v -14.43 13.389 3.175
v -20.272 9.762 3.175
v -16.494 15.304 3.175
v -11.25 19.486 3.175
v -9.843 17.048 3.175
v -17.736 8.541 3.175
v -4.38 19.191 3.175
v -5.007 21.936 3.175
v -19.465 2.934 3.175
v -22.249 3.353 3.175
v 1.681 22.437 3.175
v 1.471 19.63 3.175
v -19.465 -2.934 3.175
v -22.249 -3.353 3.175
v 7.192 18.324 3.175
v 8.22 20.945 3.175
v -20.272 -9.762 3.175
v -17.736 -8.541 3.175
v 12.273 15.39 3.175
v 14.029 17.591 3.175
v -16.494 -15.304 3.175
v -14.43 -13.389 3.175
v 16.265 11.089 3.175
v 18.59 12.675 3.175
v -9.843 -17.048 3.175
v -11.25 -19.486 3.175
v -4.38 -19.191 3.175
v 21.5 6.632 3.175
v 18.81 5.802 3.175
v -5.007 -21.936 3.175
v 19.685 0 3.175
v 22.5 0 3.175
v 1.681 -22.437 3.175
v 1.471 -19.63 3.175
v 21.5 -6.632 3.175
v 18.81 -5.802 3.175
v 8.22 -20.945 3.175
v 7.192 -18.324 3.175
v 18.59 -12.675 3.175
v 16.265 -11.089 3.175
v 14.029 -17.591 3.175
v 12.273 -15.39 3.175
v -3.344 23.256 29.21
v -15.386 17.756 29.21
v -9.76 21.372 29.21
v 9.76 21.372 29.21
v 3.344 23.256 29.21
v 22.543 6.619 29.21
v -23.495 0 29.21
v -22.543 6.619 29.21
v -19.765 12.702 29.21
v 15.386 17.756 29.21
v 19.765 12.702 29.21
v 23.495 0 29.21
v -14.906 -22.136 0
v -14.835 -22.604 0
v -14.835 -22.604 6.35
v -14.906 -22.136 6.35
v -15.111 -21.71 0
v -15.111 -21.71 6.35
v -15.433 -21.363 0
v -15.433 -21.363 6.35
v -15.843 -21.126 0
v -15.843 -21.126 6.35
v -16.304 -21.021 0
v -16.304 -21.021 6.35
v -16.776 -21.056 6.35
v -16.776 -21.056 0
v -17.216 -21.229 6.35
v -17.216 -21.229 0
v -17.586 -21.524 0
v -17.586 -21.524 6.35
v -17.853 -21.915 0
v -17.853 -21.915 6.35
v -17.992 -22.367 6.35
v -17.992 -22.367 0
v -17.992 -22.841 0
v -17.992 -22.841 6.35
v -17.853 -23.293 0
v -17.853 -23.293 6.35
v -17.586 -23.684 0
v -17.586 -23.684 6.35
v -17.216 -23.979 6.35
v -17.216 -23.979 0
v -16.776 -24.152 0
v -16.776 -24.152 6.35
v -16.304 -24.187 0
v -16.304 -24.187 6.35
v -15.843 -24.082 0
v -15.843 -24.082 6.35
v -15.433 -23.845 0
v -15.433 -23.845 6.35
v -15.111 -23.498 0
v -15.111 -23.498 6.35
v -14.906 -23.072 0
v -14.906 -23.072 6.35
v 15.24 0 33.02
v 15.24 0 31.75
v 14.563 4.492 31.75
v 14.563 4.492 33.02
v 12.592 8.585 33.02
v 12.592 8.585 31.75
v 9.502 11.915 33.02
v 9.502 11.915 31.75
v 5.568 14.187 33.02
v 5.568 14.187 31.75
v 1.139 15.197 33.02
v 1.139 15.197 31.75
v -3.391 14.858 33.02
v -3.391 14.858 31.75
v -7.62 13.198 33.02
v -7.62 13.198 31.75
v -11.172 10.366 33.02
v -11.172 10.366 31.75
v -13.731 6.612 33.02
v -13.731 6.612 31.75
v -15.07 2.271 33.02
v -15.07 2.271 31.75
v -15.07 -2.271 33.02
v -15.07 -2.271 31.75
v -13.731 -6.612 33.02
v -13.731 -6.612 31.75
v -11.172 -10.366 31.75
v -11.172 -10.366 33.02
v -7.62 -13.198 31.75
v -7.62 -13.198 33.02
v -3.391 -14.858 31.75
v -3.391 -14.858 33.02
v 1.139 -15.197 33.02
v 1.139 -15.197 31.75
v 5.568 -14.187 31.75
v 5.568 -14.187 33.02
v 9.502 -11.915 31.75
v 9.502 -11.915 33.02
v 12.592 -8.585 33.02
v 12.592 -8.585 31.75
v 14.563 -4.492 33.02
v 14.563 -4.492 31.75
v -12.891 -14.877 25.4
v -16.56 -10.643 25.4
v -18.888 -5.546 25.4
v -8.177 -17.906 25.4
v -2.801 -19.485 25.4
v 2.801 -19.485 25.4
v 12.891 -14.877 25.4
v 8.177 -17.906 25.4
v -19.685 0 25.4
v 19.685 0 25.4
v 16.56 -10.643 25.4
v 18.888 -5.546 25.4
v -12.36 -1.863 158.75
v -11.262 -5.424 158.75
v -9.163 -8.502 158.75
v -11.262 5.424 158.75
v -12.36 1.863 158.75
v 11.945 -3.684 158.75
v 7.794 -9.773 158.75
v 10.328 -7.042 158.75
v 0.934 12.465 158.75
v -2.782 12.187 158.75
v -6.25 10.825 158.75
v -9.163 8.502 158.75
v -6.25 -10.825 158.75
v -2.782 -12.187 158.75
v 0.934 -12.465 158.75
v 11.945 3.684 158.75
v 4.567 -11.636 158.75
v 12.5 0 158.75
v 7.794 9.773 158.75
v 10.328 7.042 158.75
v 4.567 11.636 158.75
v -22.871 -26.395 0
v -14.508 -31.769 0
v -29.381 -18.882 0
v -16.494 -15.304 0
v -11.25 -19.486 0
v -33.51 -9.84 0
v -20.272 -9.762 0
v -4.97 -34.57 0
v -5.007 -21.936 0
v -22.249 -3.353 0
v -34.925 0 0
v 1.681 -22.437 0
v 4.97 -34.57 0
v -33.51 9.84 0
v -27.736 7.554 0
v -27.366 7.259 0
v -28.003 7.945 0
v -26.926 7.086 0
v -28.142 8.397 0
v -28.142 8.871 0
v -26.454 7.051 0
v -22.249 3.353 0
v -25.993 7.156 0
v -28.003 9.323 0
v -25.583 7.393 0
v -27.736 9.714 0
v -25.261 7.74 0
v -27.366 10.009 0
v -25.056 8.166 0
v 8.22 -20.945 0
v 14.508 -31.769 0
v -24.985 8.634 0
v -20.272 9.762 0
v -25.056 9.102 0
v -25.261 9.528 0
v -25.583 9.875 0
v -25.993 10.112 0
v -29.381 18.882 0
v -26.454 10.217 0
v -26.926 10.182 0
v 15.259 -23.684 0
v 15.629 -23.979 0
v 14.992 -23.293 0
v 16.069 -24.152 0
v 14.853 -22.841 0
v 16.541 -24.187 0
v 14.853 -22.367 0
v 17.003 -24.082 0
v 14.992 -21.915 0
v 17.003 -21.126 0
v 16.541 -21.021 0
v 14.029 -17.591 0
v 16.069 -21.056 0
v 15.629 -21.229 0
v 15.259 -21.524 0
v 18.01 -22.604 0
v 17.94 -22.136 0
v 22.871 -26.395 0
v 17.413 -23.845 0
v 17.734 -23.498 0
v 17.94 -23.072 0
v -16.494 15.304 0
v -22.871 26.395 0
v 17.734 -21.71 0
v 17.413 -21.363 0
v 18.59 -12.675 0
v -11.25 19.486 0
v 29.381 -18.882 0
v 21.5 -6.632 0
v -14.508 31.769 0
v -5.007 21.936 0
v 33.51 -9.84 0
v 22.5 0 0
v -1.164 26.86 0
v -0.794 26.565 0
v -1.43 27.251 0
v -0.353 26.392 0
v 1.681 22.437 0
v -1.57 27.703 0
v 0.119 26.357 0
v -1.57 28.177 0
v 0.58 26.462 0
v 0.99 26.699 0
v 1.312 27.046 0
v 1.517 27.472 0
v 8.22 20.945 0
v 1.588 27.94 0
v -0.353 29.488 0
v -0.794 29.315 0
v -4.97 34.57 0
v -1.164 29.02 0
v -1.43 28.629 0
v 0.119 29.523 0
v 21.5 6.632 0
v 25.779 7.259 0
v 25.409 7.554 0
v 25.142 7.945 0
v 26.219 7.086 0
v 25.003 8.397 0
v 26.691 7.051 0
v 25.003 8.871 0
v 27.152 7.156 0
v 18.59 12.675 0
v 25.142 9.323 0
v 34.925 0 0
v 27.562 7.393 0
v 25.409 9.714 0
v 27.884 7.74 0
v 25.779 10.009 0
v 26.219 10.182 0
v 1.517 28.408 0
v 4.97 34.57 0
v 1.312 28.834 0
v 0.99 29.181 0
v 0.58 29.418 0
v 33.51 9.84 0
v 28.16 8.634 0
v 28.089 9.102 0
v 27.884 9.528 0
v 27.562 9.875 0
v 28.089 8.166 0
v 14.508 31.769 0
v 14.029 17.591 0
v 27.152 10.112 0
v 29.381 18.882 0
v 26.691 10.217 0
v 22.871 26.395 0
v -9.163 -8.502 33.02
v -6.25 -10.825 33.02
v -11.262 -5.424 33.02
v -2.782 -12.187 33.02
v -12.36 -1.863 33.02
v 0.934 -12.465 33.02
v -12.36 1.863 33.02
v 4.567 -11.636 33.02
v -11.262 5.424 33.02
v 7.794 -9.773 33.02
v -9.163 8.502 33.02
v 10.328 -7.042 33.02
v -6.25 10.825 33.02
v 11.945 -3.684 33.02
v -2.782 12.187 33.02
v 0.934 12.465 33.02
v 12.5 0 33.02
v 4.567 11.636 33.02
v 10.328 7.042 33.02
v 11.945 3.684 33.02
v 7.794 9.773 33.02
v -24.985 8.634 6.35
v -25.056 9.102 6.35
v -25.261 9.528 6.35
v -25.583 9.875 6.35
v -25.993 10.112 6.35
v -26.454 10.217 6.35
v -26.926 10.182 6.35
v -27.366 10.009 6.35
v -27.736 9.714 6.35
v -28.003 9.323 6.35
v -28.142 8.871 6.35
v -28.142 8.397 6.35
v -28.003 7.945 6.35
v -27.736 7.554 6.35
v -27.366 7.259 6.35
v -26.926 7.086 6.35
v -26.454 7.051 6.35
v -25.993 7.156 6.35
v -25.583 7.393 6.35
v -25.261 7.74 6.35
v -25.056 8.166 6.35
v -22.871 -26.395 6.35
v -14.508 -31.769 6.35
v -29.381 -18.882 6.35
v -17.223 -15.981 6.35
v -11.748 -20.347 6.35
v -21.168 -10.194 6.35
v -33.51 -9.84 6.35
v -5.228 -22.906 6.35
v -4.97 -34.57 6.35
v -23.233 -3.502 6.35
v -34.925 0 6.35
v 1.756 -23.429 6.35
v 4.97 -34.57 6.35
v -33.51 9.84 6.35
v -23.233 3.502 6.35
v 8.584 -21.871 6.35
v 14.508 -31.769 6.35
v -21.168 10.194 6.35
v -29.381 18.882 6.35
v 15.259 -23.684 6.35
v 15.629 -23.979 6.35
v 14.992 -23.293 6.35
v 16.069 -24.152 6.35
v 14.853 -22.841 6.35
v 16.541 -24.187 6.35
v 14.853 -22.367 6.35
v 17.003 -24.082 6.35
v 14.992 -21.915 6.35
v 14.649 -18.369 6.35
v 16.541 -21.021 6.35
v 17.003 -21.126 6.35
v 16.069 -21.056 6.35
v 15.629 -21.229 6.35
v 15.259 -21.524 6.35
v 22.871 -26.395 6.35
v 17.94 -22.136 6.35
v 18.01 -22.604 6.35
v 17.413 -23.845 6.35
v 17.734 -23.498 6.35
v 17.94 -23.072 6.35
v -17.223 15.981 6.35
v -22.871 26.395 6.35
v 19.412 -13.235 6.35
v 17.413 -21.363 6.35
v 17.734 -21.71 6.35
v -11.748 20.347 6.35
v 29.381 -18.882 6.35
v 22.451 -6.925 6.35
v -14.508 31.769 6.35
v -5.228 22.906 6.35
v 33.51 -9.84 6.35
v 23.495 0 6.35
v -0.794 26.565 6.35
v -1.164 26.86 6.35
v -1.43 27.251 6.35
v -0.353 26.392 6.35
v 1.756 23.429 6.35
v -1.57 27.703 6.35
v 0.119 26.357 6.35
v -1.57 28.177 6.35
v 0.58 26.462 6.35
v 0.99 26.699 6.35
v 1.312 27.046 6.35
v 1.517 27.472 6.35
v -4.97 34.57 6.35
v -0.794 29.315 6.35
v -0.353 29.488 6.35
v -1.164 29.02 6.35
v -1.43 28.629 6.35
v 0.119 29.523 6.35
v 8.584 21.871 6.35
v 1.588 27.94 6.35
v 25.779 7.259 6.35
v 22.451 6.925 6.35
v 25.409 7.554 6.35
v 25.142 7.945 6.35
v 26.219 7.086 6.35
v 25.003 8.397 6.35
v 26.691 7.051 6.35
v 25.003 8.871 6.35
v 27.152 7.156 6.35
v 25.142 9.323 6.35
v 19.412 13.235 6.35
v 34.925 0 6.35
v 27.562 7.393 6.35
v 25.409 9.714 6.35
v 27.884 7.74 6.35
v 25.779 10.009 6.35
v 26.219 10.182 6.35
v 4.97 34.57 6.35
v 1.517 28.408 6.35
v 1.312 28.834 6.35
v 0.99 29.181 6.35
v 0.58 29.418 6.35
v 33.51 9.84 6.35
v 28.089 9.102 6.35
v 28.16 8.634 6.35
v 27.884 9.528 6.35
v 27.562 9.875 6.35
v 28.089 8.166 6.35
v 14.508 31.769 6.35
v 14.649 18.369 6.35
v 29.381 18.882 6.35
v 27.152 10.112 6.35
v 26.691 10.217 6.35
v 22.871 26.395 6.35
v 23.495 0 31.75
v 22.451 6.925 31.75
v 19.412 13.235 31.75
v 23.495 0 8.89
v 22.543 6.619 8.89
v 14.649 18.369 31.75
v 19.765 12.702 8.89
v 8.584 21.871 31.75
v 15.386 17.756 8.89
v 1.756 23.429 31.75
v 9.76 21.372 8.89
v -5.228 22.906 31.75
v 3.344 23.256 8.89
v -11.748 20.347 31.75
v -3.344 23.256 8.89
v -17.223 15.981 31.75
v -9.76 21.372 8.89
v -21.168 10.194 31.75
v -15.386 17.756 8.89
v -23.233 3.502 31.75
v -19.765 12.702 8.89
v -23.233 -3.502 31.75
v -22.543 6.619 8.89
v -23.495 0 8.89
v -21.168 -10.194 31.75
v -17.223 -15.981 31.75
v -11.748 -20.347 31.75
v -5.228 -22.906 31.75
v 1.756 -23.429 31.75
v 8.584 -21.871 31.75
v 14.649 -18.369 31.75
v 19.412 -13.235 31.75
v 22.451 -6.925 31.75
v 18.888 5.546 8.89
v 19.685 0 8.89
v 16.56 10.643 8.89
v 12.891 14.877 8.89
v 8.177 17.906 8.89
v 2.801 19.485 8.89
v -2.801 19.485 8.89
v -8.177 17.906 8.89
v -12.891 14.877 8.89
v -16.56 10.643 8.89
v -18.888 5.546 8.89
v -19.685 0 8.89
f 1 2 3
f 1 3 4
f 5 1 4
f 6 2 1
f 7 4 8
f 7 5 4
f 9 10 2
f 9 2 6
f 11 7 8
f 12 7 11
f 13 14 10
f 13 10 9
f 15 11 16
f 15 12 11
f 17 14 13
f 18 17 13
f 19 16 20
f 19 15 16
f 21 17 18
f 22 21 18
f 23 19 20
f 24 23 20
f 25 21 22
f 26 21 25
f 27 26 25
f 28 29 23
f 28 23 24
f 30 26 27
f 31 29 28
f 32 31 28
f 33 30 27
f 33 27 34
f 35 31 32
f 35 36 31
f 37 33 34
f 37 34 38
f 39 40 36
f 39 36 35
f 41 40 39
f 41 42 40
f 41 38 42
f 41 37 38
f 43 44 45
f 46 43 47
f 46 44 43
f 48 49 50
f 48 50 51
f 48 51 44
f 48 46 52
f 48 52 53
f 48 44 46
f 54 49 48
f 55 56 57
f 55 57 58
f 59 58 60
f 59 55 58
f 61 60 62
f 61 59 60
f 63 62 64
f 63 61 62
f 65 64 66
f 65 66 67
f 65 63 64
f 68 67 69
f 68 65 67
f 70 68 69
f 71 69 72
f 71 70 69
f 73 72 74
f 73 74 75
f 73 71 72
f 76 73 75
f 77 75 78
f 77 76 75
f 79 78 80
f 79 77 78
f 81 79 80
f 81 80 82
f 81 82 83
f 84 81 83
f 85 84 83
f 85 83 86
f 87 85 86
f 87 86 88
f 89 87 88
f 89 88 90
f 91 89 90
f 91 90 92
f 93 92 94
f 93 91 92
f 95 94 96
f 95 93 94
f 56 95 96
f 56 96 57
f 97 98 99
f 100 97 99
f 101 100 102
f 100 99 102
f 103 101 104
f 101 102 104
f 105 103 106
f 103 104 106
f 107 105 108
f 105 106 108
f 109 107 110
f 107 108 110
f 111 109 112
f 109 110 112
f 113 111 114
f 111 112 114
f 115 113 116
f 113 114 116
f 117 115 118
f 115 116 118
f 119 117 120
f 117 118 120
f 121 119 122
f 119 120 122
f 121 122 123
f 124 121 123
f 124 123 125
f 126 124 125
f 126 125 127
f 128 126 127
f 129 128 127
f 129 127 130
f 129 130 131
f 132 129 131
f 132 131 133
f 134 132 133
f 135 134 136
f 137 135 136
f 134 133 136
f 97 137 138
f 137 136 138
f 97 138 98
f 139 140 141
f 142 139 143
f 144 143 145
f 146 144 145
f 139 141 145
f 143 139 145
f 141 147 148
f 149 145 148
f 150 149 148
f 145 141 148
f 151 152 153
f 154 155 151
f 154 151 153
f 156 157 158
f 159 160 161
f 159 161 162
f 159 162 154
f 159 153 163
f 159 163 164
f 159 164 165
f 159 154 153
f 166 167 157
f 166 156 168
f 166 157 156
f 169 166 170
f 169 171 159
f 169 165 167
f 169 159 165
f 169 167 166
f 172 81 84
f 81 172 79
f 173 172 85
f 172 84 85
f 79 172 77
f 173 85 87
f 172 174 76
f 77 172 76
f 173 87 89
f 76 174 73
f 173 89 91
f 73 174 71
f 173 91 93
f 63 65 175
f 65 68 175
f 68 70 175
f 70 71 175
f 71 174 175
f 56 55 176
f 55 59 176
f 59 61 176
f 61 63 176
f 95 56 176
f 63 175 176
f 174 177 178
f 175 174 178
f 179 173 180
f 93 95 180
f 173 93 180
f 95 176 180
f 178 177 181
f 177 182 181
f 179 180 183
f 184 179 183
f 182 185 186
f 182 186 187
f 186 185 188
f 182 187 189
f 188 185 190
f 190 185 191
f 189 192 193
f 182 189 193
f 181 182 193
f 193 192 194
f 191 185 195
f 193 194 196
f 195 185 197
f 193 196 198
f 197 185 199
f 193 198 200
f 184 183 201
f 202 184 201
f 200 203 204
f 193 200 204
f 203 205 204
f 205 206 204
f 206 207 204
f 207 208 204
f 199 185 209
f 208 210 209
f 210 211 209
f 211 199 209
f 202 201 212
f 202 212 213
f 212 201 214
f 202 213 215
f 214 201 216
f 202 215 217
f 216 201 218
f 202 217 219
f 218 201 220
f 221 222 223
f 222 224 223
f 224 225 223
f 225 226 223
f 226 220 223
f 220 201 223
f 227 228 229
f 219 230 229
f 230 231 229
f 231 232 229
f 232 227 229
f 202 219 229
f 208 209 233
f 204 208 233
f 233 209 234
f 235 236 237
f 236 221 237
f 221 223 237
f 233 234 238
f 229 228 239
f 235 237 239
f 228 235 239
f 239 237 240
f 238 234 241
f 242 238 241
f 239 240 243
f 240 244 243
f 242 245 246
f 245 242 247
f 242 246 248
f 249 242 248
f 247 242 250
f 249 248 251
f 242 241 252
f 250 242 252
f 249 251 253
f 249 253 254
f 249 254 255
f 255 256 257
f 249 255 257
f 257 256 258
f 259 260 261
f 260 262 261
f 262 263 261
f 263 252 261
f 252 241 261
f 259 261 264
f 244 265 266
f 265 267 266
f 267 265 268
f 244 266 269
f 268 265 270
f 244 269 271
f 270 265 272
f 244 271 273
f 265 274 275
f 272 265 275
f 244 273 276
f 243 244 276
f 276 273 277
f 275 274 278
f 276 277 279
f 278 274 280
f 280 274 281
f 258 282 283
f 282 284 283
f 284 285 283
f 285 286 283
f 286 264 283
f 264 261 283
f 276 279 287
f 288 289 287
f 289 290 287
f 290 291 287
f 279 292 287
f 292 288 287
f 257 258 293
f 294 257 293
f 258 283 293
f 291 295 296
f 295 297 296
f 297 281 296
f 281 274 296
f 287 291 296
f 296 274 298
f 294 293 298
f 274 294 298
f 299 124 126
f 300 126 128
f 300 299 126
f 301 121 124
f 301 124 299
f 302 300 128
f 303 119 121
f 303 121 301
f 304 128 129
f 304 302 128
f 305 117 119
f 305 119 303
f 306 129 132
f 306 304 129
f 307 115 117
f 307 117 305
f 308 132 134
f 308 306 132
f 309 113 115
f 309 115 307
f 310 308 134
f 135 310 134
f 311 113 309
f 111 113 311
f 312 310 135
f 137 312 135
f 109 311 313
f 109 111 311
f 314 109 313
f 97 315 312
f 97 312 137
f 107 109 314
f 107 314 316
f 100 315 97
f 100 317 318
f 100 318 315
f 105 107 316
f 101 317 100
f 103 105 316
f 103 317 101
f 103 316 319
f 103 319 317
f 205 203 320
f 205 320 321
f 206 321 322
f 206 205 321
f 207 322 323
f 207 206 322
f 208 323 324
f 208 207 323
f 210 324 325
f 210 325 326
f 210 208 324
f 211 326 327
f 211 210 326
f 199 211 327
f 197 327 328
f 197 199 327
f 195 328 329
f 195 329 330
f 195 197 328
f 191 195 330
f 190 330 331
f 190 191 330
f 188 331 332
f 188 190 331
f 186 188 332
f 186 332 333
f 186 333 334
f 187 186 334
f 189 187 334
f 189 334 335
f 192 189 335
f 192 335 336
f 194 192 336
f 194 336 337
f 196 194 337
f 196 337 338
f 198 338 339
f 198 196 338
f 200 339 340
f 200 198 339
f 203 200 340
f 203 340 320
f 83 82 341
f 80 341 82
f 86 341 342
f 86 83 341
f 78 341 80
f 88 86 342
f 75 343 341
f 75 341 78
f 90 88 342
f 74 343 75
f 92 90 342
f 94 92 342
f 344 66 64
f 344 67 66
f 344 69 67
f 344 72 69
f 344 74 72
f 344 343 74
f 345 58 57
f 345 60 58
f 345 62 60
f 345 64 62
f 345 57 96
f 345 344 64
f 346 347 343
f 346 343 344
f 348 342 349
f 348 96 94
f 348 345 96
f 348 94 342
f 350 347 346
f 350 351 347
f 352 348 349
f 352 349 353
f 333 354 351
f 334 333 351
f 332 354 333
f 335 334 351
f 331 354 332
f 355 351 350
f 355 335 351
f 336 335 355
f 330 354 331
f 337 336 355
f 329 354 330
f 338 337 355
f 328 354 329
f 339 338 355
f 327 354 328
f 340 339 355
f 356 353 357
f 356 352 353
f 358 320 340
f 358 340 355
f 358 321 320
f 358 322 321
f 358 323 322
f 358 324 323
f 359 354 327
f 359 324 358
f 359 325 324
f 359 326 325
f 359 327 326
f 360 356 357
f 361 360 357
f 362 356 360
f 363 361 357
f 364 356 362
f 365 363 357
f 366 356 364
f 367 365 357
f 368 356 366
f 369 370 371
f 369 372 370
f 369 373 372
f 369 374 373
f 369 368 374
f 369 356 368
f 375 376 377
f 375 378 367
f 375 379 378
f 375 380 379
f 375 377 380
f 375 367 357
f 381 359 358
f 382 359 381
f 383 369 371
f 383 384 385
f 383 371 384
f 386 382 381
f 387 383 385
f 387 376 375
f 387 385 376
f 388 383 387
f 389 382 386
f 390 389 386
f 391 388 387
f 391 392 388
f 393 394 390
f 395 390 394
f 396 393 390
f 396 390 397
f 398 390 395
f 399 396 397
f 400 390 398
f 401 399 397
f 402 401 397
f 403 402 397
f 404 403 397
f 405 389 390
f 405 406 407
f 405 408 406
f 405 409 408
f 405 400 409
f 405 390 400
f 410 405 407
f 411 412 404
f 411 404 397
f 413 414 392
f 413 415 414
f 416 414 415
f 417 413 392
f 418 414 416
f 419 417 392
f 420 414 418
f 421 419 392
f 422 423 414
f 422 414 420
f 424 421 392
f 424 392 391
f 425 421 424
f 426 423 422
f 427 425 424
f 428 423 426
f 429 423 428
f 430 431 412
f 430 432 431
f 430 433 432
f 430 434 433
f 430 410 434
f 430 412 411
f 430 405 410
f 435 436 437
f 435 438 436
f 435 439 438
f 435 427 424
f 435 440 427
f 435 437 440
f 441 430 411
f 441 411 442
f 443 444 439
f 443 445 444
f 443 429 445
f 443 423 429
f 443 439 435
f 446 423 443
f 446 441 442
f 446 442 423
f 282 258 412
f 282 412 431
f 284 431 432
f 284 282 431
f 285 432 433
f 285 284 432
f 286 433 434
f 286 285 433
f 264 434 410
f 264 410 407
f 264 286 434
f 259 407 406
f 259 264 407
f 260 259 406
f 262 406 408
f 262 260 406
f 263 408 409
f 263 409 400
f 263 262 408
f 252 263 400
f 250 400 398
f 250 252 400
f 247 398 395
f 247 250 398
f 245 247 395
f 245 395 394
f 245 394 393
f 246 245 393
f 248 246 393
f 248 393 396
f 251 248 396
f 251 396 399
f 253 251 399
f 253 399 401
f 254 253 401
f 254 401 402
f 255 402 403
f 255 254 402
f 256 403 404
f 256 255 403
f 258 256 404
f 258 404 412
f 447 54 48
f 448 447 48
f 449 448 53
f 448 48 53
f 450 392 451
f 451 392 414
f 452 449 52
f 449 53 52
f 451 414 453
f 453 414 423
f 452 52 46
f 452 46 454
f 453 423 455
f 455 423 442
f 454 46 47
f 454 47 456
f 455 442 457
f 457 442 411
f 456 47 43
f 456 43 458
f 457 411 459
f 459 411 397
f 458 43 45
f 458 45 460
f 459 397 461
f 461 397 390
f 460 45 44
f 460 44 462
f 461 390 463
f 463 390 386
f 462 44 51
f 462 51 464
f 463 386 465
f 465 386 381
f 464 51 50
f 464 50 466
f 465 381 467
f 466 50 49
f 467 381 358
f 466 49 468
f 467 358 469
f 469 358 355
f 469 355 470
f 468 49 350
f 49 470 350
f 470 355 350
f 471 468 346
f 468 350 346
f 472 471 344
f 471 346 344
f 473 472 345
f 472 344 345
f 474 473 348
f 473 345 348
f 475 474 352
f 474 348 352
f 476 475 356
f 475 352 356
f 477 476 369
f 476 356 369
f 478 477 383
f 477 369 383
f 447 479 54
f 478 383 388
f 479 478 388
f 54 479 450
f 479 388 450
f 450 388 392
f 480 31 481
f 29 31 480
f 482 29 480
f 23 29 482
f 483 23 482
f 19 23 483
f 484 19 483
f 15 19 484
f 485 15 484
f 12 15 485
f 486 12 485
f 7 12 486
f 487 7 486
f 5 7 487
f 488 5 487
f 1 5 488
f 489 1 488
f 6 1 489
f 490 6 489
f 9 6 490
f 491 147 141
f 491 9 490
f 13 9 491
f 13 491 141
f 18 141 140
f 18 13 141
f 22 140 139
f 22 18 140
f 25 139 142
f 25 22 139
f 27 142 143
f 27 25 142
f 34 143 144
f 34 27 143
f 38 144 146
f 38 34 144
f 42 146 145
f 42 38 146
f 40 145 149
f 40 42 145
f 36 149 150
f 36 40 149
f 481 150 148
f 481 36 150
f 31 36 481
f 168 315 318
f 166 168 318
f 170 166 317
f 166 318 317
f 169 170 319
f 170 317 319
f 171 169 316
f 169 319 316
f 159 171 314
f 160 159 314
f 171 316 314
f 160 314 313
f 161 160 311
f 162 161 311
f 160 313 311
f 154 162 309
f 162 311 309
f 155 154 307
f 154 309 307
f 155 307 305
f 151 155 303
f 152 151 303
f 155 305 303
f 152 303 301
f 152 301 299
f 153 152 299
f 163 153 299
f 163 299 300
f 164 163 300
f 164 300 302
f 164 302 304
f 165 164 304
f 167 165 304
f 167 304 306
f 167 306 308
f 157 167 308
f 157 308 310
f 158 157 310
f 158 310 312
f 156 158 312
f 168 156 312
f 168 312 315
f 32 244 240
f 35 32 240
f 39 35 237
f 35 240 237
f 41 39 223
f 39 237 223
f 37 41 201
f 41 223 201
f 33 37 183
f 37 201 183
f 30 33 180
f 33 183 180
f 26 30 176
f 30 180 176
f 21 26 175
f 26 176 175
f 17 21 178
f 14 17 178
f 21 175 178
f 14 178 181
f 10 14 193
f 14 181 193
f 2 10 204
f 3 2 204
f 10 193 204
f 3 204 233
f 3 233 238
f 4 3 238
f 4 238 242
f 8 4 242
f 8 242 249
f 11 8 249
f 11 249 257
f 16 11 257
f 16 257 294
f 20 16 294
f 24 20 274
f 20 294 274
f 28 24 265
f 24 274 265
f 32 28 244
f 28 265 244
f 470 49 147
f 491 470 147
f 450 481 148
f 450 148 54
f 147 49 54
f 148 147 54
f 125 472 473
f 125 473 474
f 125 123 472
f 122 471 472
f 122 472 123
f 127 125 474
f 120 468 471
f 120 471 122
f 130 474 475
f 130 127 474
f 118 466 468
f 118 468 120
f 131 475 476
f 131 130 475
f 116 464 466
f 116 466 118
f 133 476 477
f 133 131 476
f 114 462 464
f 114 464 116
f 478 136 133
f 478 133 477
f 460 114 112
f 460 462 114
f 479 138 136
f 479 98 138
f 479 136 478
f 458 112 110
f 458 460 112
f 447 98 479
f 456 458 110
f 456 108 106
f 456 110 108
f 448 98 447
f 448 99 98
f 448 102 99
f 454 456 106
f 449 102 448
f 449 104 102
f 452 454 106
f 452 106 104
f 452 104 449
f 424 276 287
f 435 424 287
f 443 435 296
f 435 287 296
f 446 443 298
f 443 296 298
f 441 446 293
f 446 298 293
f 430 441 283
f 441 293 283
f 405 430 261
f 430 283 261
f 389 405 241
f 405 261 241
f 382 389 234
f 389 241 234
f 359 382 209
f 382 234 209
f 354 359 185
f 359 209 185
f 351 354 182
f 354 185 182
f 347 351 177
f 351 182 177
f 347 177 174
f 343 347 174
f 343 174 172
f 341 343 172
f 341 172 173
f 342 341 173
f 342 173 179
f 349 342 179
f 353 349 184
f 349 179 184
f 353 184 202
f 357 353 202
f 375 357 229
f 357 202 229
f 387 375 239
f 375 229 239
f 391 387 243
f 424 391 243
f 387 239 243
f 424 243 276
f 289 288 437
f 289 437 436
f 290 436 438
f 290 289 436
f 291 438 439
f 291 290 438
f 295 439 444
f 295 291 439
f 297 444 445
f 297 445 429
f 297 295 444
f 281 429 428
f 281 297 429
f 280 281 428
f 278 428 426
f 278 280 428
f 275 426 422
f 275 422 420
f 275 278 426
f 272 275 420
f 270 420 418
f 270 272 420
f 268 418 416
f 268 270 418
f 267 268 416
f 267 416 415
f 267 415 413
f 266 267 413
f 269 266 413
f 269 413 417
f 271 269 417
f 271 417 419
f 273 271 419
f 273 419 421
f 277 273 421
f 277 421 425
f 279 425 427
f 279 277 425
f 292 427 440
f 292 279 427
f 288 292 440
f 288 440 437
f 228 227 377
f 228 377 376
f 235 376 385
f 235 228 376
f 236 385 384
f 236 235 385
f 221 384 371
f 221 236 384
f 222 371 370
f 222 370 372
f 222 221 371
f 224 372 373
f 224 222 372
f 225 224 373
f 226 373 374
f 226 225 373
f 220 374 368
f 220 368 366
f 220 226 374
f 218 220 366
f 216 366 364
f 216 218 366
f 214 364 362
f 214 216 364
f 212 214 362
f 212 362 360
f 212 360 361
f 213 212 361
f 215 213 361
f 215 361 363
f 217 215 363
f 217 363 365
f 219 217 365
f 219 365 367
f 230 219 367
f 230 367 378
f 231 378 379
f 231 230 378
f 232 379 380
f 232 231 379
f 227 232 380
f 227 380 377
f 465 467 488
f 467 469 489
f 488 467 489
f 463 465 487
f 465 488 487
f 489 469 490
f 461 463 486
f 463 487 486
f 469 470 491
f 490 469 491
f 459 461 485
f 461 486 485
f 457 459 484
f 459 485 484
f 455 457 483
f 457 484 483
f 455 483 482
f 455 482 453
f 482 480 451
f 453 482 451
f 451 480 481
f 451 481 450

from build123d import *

# Parameters (mm, degrees)
F0_R      = 34.925
F0_R_2    = 1.5875
F1_DEPTH  = 6.35
F2_R      = 22.5
F3_DEPTH  = 3.175
F4_R      = 19.685
F5_DEPTH  = 3.176
F6_R      = 23.495
F6_R_2    = 19.685
F7_DEPTH  = 19.05
F8_R      = 23.495
F9_DEPTH  = 6.35
F10_R     = 12.5
F11_DEPTH = 127
F12_R     = 15.24
F13_DEPTH = 1.27
F14_W     = 46.99
F14_H     = 20.32
F15_DEPTH = 25.4


with BuildPart() as f1:
    # F0 (on Top) → F1 (new body)
    with BuildSketch(Plane.XY):
        Circle(F0_R)
        with Locations((-16.42272, -22.603935)):
            Circle(F0_R_2, mode=Mode.SUBTRACT)
        with Locations((16.42272, -22.603935)):
            Circle(F0_R_2, mode=Mode.SUBTRACT)
        with Locations((-26.572519, 8.633935)):
            Circle(F0_R_2, mode=Mode.SUBTRACT)
        with Locations((26.572519, 8.633935)):
            Circle(F0_R_2, mode=Mode.SUBTRACT)
        with Locations((0, 27.94)):
            Circle(F0_R_2, mode=Mode.SUBTRACT)
    extrude(amount=F1_DEPTH)

    # F2 (on face) → F3 (cut)
    with BuildSketch(Plane(origin=(0, 0, 0), x_dir=(1, 0, 0), z_dir=(0, 0, -1))):
        Circle(F2_R)
    extrude(amount=-F3_DEPTH, mode=Mode.SUBTRACT)

    # F4 (on face) → F5 (cut, through all)
    with BuildSketch(Plane(origin=(0, 0, 3.175), x_dir=(1, 0, 0), z_dir=(0, 0, -1))):
        Circle(F4_R)
    extrude(amount=-F5_DEPTH, mode=Mode.SUBTRACT)

    # F6 (on face) → F7 (join)
    with BuildSketch(Plane.XY.offset(6.35)):
        Circle(F6_R)
        Circle(F6_R_2, mode=Mode.SUBTRACT)
    extrude(amount=F7_DEPTH)

    # F8 (on face) → F9 (join)
    with BuildSketch(Plane.XY.offset(25.4)):
        Circle(F8_R)
    extrude(amount=F9_DEPTH)

    # F10 (on face) → F11 (join)
    with BuildSketch(Plane.XY.offset(31.75)):
        Circle(F10_R)
    extrude(amount=F11_DEPTH)

    # F12 (on face) → F13 (join)
    with BuildSketch(Plane.XY.offset(31.75)):
        Circle(F12_R)
    extrude(amount=F13_DEPTH)

    # F14 (on Front) → F15 (cut)
    with BuildSketch(Plane.XZ):
        with Locations((0, 19.05)):
            Rectangle(F14_W, F14_H)
    extrude(amount=-F15_DEPTH, mode=Mode.SUBTRACT)


solid = f1.part
